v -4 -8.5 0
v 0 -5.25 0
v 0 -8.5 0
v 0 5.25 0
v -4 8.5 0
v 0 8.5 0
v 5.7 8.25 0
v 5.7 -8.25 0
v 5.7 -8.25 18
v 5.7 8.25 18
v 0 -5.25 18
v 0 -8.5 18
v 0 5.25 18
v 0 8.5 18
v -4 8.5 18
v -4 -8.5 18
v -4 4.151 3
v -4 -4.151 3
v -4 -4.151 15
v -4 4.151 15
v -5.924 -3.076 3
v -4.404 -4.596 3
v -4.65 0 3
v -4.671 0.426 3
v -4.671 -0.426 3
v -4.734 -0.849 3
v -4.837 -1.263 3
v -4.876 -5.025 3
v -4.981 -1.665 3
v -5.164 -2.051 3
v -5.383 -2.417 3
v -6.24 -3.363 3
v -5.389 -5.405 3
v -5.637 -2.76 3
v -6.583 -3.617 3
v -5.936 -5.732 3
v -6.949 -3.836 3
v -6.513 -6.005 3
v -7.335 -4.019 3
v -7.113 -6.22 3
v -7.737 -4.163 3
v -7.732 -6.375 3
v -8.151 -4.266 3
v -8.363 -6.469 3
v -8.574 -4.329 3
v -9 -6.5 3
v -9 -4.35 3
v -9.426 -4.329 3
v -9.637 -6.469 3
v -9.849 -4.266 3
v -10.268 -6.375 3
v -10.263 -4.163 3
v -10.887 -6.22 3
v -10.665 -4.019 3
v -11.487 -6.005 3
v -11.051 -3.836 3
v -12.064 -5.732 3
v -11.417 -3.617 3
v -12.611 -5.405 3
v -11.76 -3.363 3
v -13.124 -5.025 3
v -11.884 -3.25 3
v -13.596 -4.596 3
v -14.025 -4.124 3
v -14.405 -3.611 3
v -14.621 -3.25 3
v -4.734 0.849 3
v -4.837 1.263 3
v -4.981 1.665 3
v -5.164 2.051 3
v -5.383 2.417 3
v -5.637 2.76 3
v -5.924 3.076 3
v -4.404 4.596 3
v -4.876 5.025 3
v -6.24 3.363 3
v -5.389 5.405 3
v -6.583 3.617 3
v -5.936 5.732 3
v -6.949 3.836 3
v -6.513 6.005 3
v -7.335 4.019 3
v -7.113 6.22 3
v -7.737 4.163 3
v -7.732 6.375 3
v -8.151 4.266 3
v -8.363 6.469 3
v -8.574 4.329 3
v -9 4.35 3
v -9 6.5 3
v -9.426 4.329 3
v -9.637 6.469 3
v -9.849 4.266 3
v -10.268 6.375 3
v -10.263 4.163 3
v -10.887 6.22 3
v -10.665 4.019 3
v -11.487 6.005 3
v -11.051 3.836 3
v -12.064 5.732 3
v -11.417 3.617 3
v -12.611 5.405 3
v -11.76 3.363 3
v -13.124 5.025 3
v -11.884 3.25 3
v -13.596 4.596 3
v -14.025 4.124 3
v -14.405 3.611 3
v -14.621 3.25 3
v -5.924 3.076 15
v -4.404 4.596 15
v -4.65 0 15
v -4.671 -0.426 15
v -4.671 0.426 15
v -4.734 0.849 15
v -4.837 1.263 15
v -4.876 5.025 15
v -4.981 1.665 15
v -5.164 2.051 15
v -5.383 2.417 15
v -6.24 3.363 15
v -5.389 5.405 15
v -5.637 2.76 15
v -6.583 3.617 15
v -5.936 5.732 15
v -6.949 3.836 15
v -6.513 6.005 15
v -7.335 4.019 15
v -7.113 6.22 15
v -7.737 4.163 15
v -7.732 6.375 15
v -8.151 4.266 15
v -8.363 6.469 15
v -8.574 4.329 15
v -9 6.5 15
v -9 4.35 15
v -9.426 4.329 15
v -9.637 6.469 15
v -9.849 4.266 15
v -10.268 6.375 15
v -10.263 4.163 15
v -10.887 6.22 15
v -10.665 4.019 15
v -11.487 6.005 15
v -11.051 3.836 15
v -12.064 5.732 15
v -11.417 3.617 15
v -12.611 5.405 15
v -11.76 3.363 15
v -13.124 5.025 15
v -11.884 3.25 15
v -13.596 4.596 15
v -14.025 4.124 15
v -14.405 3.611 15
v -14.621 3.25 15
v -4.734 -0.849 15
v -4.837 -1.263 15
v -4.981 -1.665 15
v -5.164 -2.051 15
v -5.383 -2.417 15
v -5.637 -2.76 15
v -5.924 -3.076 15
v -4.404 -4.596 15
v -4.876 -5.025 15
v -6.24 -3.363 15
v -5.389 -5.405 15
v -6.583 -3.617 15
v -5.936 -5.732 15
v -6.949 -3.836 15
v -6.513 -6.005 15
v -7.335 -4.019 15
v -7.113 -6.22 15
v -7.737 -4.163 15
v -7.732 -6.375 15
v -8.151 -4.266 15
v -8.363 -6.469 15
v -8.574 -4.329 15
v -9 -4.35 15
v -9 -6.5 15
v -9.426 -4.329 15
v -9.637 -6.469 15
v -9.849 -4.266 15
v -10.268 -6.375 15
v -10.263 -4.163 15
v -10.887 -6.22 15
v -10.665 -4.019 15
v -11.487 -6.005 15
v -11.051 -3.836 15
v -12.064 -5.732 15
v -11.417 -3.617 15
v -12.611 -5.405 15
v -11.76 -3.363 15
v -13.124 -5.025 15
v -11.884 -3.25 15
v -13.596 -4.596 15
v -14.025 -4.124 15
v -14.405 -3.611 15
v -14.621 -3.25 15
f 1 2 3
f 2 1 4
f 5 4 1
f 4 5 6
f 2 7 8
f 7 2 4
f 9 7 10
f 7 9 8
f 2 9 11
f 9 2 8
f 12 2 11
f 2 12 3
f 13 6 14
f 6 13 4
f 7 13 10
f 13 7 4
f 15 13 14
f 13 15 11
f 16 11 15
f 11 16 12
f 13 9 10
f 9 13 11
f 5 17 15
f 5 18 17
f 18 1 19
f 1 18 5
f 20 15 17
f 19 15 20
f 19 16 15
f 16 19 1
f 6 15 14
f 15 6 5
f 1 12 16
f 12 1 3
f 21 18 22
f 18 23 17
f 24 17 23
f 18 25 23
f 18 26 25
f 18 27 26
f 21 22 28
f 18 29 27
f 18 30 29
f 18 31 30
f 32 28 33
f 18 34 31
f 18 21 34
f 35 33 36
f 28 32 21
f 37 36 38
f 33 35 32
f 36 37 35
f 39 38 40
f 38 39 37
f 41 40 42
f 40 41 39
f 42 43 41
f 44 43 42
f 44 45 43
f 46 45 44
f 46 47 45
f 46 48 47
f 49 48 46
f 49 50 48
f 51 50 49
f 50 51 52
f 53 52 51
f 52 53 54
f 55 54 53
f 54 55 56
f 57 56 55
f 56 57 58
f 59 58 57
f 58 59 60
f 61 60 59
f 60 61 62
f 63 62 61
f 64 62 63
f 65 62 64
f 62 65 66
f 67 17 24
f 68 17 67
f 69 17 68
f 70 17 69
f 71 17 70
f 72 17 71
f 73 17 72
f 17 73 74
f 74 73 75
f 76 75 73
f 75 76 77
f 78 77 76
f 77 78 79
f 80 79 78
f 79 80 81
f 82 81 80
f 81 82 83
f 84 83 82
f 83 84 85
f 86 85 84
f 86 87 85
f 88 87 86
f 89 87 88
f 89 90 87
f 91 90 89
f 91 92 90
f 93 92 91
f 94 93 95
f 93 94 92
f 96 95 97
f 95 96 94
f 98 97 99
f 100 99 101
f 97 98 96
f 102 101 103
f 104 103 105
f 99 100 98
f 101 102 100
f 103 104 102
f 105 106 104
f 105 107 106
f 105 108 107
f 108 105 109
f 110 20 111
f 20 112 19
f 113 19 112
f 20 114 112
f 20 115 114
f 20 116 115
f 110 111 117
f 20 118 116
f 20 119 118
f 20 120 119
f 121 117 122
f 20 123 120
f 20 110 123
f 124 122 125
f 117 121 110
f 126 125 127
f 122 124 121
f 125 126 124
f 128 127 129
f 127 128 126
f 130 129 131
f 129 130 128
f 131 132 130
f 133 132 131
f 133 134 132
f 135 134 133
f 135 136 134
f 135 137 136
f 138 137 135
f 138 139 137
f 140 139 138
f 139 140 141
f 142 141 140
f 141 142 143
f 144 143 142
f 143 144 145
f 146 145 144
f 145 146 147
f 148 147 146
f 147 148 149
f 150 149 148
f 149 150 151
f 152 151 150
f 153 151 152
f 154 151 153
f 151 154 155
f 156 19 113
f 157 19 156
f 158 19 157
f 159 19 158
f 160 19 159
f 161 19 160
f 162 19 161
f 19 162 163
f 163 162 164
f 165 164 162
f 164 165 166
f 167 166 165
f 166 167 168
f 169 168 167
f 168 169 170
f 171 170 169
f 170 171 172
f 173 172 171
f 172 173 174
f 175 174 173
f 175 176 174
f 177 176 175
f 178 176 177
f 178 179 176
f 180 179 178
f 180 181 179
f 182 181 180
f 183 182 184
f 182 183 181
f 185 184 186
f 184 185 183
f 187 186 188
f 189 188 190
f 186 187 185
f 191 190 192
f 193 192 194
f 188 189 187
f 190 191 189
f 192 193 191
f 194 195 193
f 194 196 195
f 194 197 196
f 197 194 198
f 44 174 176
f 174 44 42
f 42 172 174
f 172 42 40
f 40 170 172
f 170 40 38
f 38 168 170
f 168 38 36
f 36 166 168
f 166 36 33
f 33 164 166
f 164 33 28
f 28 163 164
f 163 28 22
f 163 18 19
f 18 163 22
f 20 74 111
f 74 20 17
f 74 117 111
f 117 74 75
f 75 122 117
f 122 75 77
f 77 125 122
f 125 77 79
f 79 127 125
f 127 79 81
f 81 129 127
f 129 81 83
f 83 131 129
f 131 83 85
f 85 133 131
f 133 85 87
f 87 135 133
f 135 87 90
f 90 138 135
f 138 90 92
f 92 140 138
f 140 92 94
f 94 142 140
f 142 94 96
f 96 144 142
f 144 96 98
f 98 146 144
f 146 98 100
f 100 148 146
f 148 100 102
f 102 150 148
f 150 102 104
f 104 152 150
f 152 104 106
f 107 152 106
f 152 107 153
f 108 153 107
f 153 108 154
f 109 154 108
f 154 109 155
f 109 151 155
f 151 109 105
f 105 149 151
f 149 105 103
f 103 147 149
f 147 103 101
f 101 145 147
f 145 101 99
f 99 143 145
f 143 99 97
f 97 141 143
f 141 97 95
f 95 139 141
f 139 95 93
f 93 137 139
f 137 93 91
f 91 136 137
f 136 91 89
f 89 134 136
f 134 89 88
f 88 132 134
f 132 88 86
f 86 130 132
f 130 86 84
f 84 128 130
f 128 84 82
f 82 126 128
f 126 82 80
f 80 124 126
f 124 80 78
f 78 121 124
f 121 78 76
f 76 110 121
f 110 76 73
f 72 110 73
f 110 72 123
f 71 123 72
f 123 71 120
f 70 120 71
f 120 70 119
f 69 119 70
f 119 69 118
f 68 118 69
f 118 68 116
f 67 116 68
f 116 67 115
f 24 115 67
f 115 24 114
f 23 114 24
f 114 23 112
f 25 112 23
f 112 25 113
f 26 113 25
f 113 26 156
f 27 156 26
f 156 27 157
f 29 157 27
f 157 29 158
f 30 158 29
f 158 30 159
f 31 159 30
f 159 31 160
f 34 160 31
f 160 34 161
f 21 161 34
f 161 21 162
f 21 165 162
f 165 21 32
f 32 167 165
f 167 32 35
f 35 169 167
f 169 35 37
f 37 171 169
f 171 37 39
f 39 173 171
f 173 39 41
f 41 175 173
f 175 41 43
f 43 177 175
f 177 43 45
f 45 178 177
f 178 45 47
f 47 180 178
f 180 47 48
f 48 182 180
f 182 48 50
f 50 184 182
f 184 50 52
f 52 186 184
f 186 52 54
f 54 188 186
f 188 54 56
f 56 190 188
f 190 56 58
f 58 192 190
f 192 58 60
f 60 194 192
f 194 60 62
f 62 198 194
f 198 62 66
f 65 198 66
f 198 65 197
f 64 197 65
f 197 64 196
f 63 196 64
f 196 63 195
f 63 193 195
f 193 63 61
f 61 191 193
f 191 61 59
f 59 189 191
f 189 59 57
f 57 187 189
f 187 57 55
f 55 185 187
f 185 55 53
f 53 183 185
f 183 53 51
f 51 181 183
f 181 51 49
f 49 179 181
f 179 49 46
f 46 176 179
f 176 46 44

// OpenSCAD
// file: stand_cable_clamp_common.scad
// stand_cable_clamp_common.scad — modular cable clamp for round stand poles.
//
// A split C-clamp pops over the pole and an M5 bolt + wingnut cinches it tight
// (the bolt head is captured in a hex pocket, so you only turn the wingnut —
// tool-free reposition). A dovetail on the clamp face takes slide-on cable
// heads, so one clamp accepts any attachment.
//
//   clamp(tube_d)   — the pole clamp (set tube_d to your pole OD)
//   head_hook()     — open J-hook
//   head_clip()     — snap cable clip
//   head_comb()     — multi-cable comb
//   head_velcro()   — velcro-strap slot
//
// On-Stage SS8800B+ upper shaft = 34.9 mm (1⅜") or 38.1 mm (1½" w/ sleeve).
// Measure the crank-up column for a wider variant.

TUBE_D = 35;        // pole outer diameter (set per stand)
CLEAR  = 0.6;       // clamp bore clearance
WALL   = 5;         // clamp wall
H      = 22;        // clamp height (along the pole)
GAP    = 4;         // split-gap width
EAR_L  = 18; EAR_W = 10;
BOLT_D = 5.4;       // M5 clearance
HEX_AF = 8.2;       // M5 hex head/nut across-flats (capture pocket)
HEX_T  = 4.5;

// dovetail (undercut: mouth narrower than back so the head can't pull out)
DT_MOUTH = 11; DT_BACK = 17; DT_DEPTH = 6; DT_H = 18; DT_STOP = 3; DT_CLEAR = 0.5;
CABLE_D = 8;        // nominal cable diameter for clip/comb

$fn = 64;

// dovetail solid: mouth (narrow) at x=0 facing -X, widening to back at x=depth, extruded up Z
module dt_prism(mouth, back, depth, h) {
    linear_extrude(h) polygon([[0, -mouth/2], [0, mouth/2], [depth, back/2], [depth, -back/2]]);
}
module dt_tongue() { dt_prism(DT_MOUTH - DT_CLEAR, DT_BACK - DT_CLEAR, DT_DEPTH - 0.3, DT_H); }

// ---- clamp ----
module clamp(tube_d = TUBE_D) {
    ir = tube_d / 2 + CLEAR; orr = ir + WALL;
    boss_x = -orr - DT_DEPTH - 2;        // -X outer face of the dovetail boss
    difference() {
        union() {
            cylinder(h = H, r = orr);
            translate([orr - 3, GAP / 2, 0]) cube([EAR_L, EAR_W, H]);            // +Y ear
            translate([orr - 3, -GAP / 2 - EAR_W, 0]) cube([EAR_L, EAR_W, H]);   // -Y ear
            translate([boss_x, -(DT_BACK / 2 + 4), 0]) cube([DT_DEPTH + 5, DT_BACK + 8, H]); // dovetail boss
        }
        translate([0, 0, 0]) cylinder(h = 3 * H, r = ir, center = true);         // bore
        translate([0, -GAP / 2, -1]) cube([orr + EAR_L + 5, GAP, H + 2]);        // split slot
        // wingnut bolt through the ears (along Y)
        translate([orr + EAR_L - 8, GAP / 2 + EAR_W + 3, H / 2]) rotate([90, 0, 0]) cylinder(h = 2 * EAR_W + GAP + 8, d = BOLT_D);
        // hex pocket captures the bolt head on the +Y ear outer face
        translate([orr + EAR_L - 8, GAP / 2 + EAR_W + HEX_T, H / 2]) rotate([90, 0, 0]) cylinder(h = HEX_T + 1, d = HEX_AF / cos(30), $fn = 6);
        // dovetail socket groove (open top, solid below DT_STOP as a slide stop)
        translate([boss_x, 0, DT_STOP]) dt_prism(DT_MOUTH, DT_BACK, DT_DEPTH, H);
    }
}

// ---- heads (universal; mount via the dovetail tongue at x=0..DT_DEPTH) ----
module _backplate(t = 4) { translate([-t, -DT_BACK / 2, 0]) cube([t, DT_BACK, DT_H]); }

module head_hook() {
    dt_tongue(); _backplate();
    translate([-4, 0, DT_H / 2]) rotate([90, 0, 0])
        rotate_extrude(angle = 250) translate([16, 0]) circle(d = 7);
}
module head_clip(clip_w = 12) {
    dt_tongue(); _backplate();
    // C-clip (vertical cable), ring connects to the backplate on +X, mouth opens -X
    ring_out = CABLE_D + 5;
    translate([-4 - ring_out / 2 + 1.5, 0, (DT_H - clip_w) / 2])
        linear_extrude(clip_w) difference() {
            circle(d = ring_out);
            circle(d = CABLE_D + 0.7);
            translate([-ring_out, -(CABLE_D - 1.5) / 2]) square([ring_out, CABLE_D - 1.5]); // snap mouth (-X)
        }
}
module head_comb(n = 4) {
    dt_tongue(); _backplate();
    bar_w = n * (CABLE_D + 3) + 3;
    translate([-4 - 8, -bar_w / 2, 0]) difference() {
        cube([10, bar_w, DT_H]);
        for (i = [0 : n - 1]) translate([-1, 3 + i * (CABLE_D + 3) + CABLE_D / 2, DT_H]) rotate([0, 90, 0]) cylinder(d = CABLE_D, h = 12); // open-top slots
        for (i = [0 : n - 1]) translate([-1, 3 + i * (CABLE_D + 3) + CABLE_D / 2, DT_H - CABLE_D / 2]) cube([12, CABLE_D, CABLE_D]);
    }
}
module head_velcro(strap_w = 25, strap_t = 3) {
    dt_tongue(); _backplate();
    translate([-4 - 6, -(strap_w + 8) / 2, 0]) difference() {
        cube([6, strap_w + 8, DT_H]);
        translate([-1, 4, DT_H / 2 - strap_t / 2]) cube([8, strap_w, strap_t]); // strap thru-slot
    }
}
// main file
// head_clip — slide-on cable head (universal dovetail mount).
include <stand_cable_clamp_common.scad>
head_clip();
